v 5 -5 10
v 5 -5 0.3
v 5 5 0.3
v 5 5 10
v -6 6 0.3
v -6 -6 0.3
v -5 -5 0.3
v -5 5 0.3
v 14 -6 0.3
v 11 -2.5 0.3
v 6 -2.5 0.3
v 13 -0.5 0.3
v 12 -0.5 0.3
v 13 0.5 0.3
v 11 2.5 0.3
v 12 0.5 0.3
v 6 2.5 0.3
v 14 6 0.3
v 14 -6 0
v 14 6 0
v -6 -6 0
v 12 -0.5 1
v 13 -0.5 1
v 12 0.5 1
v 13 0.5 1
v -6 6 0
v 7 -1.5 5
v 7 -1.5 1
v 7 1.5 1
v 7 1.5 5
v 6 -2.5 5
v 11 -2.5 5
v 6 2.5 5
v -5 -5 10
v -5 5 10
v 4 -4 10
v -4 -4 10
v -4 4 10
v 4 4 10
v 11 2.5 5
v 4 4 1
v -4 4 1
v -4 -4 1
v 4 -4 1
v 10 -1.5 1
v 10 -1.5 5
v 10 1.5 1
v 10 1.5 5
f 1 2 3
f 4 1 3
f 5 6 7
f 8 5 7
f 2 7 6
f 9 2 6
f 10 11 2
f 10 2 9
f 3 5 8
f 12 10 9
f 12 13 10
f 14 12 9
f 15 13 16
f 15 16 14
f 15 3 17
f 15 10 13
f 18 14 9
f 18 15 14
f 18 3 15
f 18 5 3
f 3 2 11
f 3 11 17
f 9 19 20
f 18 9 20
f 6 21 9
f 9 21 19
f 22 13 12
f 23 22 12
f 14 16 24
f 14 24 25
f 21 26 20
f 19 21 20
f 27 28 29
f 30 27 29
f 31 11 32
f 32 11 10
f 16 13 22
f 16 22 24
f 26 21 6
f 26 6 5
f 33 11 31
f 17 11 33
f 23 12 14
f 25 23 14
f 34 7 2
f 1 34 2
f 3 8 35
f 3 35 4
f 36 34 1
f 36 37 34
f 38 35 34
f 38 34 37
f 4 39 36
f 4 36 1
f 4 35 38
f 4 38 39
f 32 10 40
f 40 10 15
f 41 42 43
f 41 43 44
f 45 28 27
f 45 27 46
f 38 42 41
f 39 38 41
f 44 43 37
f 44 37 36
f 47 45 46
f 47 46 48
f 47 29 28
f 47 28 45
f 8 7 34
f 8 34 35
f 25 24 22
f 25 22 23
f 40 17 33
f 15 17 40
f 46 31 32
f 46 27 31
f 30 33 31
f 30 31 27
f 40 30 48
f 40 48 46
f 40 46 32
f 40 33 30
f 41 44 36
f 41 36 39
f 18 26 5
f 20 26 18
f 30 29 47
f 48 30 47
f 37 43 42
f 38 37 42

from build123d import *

# Parameters (mm, degrees)
F0_W         = 10
F0_H         = 10
F1_DEPTH     = 10
F0_W_2       = 5
F0_H_2       = 5
F2_DEPTH     = 5
F0_W_3       = 1
F0_H_3       = 1
F3_DEPTH     = 1
F0_W_4       = 20
F0_H_4       = 12
F4_DEPTH     = 0.3
F5_T         = 1
F5_T3_DEPTH  = 3
F5_T5_DEPTH  = 12
F5_T7_DEPTH  = 12
F5_T9_DEPTH  = 7
F5_T11_DEPTH = 7
F5_T13_DEPTH = 3


# Not quite as in the source:
# - a shell that OpenCascade refuses in one call is made with other operations: the cavity is built on its own and cut out


with BuildPart() as f1:
    # F0 (on Top) → F1 (new body)
    with BuildSketch(Plane.XY):
        Rectangle(F0_W, F0_H)
    extrude(amount=F1_DEPTH)



with BuildPart() as f2:
    # F0 (on Top) → F2 (new body)
    with BuildSketch(Plane.XY):
        with Locations((8.5, 0)):
            Rectangle(F0_W_2, F0_H_2)
    extrude(amount=F2_DEPTH)


with BuildPart() as f3:
    # F0 (on Top) → F3 (new body)
    with BuildSketch(Plane.XY):
        with Locations((12.5, 0)):
            Rectangle(F0_W_3, F0_H_3)
    extrude(amount=F3_DEPTH)


with BuildPart() as f1_1:
    add(f1.part)

    add(f2.part)  # F4 merges F2

    add(f3.part)  # F4 merges F3
    # F0 (on Top) → F4 (join)
    with BuildSketch(Plane.XY):
        with Locations((4, 0)):
            Rectangle(F0_W_4, F0_H_4)
        Rectangle(F0_W, F0_H, mode=Mode.SUBTRACT)
        with Locations((8.5, 0)):
            Rectangle(F0_W_2, F0_H_2, mode=Mode.SUBTRACT)
        with Locations((12.5, 0)):
            Rectangle(F0_W_3, F0_H_3, mode=Mode.SUBTRACT)
    extrude(amount=F4_DEPTH)

    # F5: shell of thickness 1, made by hand


with BuildPart() as f5_core1:
    # F5_t2: copy of F1
    add(f1_1.part)

    # the walls: a layer under each face that stays
    f5_faces = [f5_core1.faces().sort_by_distance(p)[0] for p in [
        (13, 0, 0.65),
        (10.6666666667, -4, 0.3),
        (12.5, 0.5, 0.65),
        (12.5, -0.5, 0.65),
        (4, 6, 0.15),
        (-6, 0, 0.15),
        (4, -6, 0.15),
        (14, 0, 0.15),
        (0, 5, 5.15),
        (5, 0, 5.15),
        (0, -5, 5.15),
        (-5, 0, 5.15),
        (8.5, 2.5, 2.65),
        (11, 0, 2.65),
        (8.5, -2.5, 2.65),
        (6, 0, 2.65),
        (12, 0, 0.65),
        (4, 0, 0),
    ]]
    thicken(f5_faces, amount=-F5_T, mode=Mode.SUBTRACT)

    # F5_s4 → F5_t3 (cut)
    with BuildSketch(Plane.XZ.offset(-1.5)):
        Polygon((13.01, 0.31), (12, 0.3), (12, -0.7), (13, -0.7), align=None)
        Polygon((11.99, 0.31), (12, -0.7), (13, -0.7), (13, 0.3), align=None)
    extrude(amount=F5_T3_DEPTH, mode=Mode.SUBTRACT)

    # F5_s6 → F5_t5 (cut)
    with BuildSketch(Plane.YZ.offset(-6)):
        Polygon((5.01, 0.31), (5, -0.7), (4, -0.7), (4, 0.3), align=None)
        Polygon((-5.01, 0.31), (-5, -0.7), (-4, -0.7), (-4, 0.3), align=None)
    extrude(amount=F5_T5_DEPTH, mode=Mode.SUBTRACT)

    # F5_s8 → F5_t7 (cut)
    with BuildSketch(Plane.XZ.offset(-6)):
        Polygon((5.01, 0.31), (5, -0.7), (4, -0.7), (4, 0.3), align=None)
        Polygon((-5.01, 0.31), (-5, -0.7), (-4, -0.7), (-4, 0.3), align=None)
    extrude(amount=F5_T7_DEPTH, mode=Mode.SUBTRACT)

    # F5_s10 → F5_t9 (cut)
    with BuildSketch(Plane.YZ.offset(5)):
        Polygon((2.51, 0.31), (2.5, -0.7), (1.5, -0.7), (1.5, 0.3), align=None)
        Polygon((-2.51, 0.31), (-2.5, -0.7), (-1.5, -0.7), (-1.5, 0.3), align=None)
    extrude(amount=F5_T9_DEPTH, mode=Mode.SUBTRACT)

    # F5_s12 → F5_t11 (cut)
    with BuildSketch(Plane.XZ.offset(-3.5)):
        Polygon((11.01, 0.31), (11, -0.7), (10, -0.7), (10, 0.3), align=None)
        Polygon((5.99, 0.31), (6, -0.7), (7, -0.7), (7, 0.3), align=None)
    extrude(amount=F5_T11_DEPTH, mode=Mode.SUBTRACT)

    # F5_s14 → F5_t13 (cut)
    with BuildSketch(Plane.YZ.offset(11)):
        Polygon((0.51, 0.31), (0.5, -0.7), (-0.5, -0.7), (-0.5, 0.3), align=None)
        Polygon((-0.51, 0.31), (-0.5, -0.7), (0.5, -0.7), (0.5, 0.3), align=None)
    extrude(amount=F5_T13_DEPTH, mode=Mode.SUBTRACT)


with BuildPart() as f1_2:
    add(f1_1.part)

    # what is left inside the walls is the cavity
    f5_cavity = [f5_core1.part.solids().sort_by_distance(p)[0] for p in [
        (3.99, 0, 7),
        (8.5, 1.49, 3.666667),
    ]]
    add(f5_cavity, mode=Mode.SUBTRACT)


solid = f1_2.part
